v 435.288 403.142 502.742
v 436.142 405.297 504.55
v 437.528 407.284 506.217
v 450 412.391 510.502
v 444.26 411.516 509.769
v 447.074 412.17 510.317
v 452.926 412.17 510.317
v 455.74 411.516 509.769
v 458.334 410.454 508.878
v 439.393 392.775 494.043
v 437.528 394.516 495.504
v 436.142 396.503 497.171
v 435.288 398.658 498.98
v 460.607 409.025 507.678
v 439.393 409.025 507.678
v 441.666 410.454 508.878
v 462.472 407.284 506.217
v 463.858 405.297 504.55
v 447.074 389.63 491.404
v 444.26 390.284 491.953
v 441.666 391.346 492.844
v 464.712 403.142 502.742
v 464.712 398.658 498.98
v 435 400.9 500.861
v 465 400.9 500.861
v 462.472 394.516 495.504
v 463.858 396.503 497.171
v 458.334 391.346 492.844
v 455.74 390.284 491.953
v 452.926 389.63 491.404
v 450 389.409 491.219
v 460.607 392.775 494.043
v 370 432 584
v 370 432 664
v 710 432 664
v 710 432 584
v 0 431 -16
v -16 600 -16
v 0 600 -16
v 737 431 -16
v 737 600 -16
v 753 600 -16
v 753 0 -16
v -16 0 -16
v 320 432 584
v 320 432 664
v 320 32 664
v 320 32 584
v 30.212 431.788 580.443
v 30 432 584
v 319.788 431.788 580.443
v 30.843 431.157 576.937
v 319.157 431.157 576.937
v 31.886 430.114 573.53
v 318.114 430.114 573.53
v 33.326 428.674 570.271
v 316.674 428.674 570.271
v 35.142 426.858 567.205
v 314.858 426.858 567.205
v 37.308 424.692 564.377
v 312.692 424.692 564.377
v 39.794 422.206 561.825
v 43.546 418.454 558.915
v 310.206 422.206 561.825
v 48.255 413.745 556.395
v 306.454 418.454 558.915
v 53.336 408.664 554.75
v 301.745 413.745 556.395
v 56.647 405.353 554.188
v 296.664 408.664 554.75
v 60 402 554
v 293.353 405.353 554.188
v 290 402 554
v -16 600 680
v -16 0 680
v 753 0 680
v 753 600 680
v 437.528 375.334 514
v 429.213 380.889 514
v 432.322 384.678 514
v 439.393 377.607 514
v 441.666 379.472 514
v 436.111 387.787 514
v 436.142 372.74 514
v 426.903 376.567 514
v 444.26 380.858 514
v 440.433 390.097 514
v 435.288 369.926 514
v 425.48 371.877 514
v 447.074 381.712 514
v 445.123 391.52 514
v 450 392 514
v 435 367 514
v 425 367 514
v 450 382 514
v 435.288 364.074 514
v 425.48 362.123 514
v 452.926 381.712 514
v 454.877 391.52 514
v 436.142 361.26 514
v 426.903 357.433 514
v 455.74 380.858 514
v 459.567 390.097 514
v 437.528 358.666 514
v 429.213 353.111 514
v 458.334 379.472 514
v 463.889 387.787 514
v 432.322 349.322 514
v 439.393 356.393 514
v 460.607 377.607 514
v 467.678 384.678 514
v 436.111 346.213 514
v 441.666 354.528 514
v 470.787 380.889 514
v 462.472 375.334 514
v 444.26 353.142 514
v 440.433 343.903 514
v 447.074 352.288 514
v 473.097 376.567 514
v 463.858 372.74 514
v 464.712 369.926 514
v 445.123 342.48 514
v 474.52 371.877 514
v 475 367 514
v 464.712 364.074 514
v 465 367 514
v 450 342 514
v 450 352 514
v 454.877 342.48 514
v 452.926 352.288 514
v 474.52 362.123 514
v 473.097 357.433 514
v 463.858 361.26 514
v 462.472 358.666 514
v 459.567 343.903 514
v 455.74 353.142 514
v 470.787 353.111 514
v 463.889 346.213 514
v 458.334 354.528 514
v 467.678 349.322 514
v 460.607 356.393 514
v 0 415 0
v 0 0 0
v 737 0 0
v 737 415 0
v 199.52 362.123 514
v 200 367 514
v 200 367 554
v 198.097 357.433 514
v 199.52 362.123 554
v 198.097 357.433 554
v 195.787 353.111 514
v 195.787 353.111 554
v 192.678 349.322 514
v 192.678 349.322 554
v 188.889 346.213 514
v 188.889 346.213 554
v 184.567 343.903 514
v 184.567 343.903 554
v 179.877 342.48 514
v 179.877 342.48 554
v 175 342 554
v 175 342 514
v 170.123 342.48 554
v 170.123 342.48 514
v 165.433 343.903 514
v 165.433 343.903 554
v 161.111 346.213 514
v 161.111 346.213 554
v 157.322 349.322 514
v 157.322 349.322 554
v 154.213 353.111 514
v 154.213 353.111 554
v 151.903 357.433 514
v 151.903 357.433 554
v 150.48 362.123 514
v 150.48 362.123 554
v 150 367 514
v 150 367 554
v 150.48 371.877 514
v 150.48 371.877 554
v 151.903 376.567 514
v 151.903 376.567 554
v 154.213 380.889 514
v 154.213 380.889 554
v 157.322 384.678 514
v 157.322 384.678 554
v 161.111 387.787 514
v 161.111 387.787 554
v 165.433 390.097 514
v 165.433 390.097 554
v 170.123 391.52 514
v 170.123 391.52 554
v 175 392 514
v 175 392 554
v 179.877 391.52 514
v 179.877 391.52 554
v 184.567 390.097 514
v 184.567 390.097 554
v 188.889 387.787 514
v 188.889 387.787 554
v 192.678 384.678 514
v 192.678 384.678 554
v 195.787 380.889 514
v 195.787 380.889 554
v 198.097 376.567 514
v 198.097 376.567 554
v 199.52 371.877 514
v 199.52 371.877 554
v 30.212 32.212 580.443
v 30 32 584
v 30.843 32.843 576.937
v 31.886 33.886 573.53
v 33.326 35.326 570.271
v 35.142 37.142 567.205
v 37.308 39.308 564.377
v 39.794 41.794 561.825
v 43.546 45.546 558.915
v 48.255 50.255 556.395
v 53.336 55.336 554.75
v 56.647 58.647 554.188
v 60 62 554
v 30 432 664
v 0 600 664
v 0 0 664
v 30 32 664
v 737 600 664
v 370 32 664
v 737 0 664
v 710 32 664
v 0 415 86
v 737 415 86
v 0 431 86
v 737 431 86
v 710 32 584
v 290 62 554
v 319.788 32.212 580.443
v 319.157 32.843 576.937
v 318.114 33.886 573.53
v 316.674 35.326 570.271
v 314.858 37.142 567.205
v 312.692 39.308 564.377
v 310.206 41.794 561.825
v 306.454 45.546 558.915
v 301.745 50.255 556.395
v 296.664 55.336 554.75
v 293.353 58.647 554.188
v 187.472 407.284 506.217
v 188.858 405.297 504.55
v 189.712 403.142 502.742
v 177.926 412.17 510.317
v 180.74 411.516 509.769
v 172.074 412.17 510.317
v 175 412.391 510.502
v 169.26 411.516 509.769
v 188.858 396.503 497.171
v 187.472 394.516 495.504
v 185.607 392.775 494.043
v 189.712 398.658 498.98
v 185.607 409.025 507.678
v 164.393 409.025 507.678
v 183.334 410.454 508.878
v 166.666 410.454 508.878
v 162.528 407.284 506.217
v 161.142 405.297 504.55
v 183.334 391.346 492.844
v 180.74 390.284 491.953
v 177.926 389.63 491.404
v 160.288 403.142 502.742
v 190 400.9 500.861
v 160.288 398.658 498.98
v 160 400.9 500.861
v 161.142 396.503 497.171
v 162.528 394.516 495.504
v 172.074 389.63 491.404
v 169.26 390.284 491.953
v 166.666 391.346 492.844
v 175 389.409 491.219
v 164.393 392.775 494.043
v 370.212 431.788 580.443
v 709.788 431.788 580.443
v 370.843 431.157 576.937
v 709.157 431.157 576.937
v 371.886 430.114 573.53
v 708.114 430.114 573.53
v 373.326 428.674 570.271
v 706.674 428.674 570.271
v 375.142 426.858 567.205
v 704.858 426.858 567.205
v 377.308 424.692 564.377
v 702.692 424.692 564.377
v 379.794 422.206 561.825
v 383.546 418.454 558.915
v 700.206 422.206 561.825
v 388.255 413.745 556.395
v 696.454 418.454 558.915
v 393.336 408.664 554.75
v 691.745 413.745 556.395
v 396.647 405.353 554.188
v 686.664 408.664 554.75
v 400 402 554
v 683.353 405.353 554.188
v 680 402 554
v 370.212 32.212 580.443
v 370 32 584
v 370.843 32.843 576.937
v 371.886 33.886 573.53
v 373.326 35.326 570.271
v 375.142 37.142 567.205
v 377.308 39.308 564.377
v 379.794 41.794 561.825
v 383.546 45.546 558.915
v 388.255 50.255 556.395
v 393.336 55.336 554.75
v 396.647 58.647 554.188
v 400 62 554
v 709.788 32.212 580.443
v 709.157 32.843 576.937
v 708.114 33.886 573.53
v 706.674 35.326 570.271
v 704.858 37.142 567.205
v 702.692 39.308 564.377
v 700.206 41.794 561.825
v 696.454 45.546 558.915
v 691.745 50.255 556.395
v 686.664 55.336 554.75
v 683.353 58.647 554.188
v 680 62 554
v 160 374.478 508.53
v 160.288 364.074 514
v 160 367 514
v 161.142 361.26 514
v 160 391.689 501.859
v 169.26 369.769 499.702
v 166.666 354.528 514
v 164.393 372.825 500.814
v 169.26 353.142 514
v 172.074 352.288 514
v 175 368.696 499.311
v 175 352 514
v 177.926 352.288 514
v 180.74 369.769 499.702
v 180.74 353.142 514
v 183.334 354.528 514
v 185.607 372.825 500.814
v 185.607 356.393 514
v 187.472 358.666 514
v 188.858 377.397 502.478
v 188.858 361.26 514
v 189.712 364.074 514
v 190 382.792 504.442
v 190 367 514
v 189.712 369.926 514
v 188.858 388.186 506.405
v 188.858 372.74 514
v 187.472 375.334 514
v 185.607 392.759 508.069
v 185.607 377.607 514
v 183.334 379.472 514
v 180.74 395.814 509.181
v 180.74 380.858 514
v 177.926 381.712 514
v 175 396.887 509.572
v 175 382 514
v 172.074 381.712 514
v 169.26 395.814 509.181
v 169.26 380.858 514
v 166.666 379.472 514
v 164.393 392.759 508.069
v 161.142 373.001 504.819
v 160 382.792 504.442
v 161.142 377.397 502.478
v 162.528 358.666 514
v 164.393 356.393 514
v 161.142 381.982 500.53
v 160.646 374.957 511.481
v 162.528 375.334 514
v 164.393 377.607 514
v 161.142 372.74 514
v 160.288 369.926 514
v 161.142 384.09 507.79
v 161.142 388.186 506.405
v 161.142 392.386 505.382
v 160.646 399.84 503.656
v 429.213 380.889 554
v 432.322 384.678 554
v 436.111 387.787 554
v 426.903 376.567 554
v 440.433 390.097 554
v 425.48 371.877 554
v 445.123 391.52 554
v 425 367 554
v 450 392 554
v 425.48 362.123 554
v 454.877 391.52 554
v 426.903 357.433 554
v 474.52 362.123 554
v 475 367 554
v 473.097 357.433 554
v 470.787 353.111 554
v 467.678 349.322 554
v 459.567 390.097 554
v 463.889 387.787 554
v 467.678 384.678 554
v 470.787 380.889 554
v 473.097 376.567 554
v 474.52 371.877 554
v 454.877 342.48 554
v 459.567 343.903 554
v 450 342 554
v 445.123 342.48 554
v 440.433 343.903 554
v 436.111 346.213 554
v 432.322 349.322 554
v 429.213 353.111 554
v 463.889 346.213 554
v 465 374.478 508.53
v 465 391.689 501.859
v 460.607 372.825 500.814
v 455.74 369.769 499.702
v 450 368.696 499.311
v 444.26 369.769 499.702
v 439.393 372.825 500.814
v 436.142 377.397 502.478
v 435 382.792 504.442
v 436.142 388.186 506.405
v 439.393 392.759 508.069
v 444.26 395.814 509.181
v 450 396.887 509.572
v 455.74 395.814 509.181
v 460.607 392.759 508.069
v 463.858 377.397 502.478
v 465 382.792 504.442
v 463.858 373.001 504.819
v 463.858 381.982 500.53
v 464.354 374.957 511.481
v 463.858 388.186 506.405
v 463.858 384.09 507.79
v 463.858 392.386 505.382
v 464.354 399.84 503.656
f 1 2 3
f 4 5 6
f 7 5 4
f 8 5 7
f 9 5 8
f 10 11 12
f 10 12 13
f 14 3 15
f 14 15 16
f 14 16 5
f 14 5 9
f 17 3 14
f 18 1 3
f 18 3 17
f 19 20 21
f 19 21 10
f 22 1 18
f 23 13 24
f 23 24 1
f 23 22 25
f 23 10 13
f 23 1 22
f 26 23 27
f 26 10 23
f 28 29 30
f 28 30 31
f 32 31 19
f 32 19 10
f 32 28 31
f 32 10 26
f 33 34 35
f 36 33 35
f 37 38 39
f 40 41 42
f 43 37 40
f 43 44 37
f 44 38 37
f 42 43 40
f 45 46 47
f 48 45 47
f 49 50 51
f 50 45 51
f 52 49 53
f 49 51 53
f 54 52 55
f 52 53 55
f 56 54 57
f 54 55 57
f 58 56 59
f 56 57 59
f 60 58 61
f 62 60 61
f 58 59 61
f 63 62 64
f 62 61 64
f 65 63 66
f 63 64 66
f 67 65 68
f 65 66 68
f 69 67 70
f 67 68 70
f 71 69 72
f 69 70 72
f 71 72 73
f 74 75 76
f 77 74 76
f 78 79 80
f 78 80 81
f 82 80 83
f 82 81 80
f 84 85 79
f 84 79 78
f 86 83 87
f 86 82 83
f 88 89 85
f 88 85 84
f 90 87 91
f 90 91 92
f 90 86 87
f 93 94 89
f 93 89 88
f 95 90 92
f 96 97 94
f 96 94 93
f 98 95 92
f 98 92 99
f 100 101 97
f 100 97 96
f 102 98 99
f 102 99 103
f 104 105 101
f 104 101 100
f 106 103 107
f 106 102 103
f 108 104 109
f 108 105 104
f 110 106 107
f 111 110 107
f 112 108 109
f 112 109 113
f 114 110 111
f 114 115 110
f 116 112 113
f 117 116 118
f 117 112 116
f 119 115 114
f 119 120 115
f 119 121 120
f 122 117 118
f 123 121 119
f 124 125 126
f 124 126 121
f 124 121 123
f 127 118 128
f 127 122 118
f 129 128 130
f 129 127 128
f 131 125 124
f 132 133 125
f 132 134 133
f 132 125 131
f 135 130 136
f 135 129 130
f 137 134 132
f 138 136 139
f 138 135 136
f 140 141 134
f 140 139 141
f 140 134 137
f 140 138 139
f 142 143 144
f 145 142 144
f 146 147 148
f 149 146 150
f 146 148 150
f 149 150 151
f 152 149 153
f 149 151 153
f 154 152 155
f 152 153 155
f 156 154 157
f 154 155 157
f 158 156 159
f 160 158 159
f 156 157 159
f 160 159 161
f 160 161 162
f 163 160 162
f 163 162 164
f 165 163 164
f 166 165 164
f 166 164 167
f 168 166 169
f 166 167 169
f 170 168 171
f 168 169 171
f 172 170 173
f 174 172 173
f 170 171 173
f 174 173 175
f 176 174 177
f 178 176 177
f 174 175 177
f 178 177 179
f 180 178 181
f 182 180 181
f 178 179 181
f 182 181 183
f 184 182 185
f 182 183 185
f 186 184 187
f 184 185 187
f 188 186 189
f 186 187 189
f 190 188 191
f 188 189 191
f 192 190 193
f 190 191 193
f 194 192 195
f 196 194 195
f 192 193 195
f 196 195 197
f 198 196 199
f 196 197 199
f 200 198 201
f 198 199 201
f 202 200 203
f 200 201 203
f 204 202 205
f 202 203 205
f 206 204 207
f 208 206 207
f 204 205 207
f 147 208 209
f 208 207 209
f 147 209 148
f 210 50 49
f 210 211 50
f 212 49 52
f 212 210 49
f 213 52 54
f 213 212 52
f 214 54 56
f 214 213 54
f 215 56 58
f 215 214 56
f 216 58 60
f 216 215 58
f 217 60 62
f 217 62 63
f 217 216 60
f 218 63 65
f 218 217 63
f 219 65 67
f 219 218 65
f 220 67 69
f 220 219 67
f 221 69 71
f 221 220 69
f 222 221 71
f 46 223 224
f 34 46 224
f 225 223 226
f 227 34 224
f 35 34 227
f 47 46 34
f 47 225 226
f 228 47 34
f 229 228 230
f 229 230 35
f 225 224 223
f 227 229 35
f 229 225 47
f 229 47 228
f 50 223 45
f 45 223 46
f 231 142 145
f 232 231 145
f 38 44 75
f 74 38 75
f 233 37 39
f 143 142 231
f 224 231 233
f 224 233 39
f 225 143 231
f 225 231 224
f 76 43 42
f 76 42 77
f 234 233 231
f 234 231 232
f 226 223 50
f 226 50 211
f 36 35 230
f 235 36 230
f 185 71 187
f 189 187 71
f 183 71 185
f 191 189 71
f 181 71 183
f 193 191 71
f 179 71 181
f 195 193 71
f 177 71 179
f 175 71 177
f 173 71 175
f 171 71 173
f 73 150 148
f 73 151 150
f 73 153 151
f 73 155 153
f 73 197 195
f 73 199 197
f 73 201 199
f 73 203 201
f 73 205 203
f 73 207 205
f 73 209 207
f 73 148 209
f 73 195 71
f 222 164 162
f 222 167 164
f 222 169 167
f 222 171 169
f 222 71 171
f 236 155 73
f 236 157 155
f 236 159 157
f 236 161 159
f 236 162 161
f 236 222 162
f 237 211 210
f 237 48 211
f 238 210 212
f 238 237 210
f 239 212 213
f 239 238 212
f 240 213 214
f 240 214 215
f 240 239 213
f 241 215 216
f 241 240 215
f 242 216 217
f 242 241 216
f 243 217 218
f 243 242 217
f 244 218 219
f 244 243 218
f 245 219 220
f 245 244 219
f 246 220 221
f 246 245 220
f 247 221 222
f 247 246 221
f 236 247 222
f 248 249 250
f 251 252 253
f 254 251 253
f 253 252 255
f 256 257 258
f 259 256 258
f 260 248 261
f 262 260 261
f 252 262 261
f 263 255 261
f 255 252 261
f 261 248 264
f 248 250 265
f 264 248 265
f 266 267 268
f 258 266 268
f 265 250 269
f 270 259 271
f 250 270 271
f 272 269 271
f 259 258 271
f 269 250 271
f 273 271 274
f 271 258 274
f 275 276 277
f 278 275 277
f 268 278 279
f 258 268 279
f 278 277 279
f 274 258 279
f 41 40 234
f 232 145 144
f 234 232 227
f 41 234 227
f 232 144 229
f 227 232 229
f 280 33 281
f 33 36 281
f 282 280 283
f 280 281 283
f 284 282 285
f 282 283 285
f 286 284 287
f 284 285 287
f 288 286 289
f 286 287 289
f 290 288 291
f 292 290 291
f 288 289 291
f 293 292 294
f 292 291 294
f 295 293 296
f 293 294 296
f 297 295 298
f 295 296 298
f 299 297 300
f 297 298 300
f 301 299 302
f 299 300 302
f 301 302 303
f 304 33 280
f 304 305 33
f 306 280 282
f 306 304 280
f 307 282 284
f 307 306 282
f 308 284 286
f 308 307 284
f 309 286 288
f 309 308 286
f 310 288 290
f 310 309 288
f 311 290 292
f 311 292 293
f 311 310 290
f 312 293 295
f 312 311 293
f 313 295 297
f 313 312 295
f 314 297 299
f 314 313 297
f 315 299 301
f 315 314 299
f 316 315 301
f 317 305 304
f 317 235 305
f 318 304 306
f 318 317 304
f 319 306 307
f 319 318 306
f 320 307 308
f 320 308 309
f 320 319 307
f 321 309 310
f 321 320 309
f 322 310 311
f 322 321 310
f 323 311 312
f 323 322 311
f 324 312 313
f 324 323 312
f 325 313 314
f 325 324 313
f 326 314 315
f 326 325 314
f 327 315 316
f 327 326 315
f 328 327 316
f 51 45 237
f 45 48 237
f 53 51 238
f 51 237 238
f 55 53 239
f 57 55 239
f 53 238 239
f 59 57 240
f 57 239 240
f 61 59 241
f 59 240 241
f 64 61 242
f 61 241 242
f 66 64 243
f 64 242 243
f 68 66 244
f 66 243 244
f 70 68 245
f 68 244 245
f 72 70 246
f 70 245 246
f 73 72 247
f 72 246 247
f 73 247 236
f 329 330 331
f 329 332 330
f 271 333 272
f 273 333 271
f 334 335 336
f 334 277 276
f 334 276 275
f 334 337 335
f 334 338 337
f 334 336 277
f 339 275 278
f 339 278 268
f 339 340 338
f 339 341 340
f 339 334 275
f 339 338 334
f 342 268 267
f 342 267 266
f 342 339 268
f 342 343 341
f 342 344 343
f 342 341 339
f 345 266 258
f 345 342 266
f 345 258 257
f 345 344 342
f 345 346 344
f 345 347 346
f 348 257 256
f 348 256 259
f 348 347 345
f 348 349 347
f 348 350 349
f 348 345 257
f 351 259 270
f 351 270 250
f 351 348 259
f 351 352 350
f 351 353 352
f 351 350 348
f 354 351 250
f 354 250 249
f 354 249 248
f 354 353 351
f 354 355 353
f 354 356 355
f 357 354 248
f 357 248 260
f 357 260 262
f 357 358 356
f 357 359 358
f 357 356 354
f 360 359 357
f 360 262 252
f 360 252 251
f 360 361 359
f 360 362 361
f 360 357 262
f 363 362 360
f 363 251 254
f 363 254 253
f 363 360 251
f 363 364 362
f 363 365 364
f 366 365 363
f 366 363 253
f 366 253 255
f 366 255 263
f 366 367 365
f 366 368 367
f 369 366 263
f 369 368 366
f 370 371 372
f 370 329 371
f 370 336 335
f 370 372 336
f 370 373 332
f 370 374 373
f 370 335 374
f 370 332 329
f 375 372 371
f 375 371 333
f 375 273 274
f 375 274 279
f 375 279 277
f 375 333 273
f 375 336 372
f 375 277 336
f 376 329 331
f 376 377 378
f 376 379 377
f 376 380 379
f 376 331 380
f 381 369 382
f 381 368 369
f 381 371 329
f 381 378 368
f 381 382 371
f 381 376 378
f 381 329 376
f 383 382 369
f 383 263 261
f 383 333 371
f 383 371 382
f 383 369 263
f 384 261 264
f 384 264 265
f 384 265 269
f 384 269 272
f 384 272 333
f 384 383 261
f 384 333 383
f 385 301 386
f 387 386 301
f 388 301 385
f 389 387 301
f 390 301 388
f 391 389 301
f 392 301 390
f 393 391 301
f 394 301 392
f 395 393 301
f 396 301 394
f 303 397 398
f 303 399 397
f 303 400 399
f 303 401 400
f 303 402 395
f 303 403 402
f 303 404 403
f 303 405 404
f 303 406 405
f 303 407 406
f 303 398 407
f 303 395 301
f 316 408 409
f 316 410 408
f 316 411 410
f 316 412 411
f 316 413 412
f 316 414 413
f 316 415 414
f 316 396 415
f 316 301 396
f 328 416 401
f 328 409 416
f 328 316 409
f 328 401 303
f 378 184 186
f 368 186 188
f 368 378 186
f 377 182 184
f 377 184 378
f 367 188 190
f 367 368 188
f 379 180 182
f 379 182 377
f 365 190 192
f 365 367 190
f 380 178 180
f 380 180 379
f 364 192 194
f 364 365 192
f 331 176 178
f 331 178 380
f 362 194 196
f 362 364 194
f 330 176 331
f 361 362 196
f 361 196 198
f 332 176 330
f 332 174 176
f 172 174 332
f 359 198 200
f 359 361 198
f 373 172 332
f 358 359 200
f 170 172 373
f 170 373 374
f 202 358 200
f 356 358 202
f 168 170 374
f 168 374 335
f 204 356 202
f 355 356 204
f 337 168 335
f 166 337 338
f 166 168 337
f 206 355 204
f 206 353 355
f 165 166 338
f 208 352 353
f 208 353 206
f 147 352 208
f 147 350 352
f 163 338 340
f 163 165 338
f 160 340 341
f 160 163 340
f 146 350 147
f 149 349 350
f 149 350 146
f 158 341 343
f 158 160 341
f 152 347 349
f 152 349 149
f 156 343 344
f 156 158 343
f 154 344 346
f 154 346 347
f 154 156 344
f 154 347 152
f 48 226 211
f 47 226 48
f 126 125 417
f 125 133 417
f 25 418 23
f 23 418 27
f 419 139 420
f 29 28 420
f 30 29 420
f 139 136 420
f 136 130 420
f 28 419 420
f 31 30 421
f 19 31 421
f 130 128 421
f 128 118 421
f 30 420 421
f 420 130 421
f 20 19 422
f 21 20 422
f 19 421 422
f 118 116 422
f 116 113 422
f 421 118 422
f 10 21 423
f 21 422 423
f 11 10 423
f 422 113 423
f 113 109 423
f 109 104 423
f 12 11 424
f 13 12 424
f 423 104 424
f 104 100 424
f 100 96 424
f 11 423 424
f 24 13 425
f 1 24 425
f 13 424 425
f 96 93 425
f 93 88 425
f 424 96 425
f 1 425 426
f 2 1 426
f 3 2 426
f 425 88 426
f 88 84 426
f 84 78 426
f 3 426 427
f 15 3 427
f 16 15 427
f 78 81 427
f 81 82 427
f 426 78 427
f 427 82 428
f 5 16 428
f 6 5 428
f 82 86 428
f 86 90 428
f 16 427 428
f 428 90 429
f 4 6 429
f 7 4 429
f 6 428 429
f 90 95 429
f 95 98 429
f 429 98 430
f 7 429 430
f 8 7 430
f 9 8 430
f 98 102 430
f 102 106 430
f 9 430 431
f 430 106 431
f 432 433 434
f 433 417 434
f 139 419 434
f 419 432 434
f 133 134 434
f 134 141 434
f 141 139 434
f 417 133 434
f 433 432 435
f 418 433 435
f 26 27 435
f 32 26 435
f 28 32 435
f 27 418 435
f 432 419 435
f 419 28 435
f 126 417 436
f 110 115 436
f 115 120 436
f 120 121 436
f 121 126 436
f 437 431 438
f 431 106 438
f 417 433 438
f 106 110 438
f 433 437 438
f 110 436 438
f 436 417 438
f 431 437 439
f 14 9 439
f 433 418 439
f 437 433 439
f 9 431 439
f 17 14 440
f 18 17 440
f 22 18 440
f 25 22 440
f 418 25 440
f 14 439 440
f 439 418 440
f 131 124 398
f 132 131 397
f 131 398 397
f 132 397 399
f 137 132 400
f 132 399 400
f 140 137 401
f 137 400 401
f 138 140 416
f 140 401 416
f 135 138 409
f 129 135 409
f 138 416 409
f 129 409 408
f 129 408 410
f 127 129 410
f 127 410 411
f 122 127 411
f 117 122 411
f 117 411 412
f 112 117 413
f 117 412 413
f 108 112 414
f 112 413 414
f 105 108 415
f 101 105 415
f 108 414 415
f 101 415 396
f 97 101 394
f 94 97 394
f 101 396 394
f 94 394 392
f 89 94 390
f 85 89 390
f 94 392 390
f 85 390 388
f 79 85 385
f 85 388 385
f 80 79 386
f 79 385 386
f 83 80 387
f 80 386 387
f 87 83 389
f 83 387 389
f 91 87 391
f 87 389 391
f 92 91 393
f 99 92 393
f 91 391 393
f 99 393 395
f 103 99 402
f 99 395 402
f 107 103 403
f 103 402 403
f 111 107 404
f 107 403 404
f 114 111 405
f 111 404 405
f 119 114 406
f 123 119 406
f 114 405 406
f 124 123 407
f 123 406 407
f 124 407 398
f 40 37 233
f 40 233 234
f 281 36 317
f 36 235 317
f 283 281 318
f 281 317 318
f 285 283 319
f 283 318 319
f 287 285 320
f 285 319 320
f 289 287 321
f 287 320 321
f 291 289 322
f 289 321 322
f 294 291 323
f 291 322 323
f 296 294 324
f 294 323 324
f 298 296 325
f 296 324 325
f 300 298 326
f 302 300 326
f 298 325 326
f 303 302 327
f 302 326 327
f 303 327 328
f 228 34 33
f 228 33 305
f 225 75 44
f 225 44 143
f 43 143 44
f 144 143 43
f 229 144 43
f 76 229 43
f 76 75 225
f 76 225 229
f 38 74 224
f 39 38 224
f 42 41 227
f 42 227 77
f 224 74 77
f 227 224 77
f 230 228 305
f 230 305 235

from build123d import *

# Parameters (mm, degrees)
F0_W      = 769
F0_H      = 696
F0_W_2    = 737
F0_H_2    = 664
F1_DEPTH  = 600
F2_W      = 737
F2_H      = 16
F3_DEPTH  = 86
F4_W      = 290
F4_H      = 400
F4_W_2    = 340
F5_DEPTH  = 110
F6_R      = 30
F7_W      = 737
F7_H      = 169
F8_DEPTH  = 16
F9_R      = 25
F10_DEPTH = 40
F11_R     = 25
F12_DEPTH = 40
F13_R     = 15
F14_ANGLE = 40


# Not quite as in the source:
# - a feature of the source that left no trace in its solid (it failed there, or was rolled back) is left out
# - a pattern or mirror of a feature is missing from the dataset's text; its kind, count and spacing are read off the source's solid


with BuildPart() as f1:
    # F0 (on Front) → F1 (new body)
    with BuildSketch(Plane.XZ):
        with Locations((368.5, 332)):
            Rectangle(F0_W, F0_H)
        with Locations((368.5, 332)):
            Rectangle(F0_W_2, F0_H_2, mode=Mode.SUBTRACT)
    extrude(amount=-F1_DEPTH)

    # F2 (on face) → F3 (join)
    with BuildSketch(Plane.XY):
        with Locations((368.5, 423)):
            Rectangle(F2_W, F2_H)
    extrude(amount=F3_DEPTH)

    # F4 (on face) → F5 (join)
    with BuildSketch(Plane(origin=(0, 0, 664), x_dir=(1, 0, 0), z_dir=(0, 0, -1))):
        with Locations((175, -232)):
            Rectangle(F4_W, F4_H)
        with Locations((540, -232)):
            Rectangle(F4_W_2, F4_H)
    extrude(amount=F5_DEPTH)

    # F6
    f6_edges = [f1.edges().sort_by_distance(p)[0] for p in [
        (175, 32, 554),
        (30, 232, 554),
        (175, 432, 554),
        (320, 232, 554),
        (540, 32, 554),
        (370, 232, 554),
        (540, 432, 554),
        (710, 232, 554),
    ]]
    fillet(f6_edges, radius=F6_R)

    # F7 (on face) → F8 (cut, through all)
    with BuildSketch(Plane.XY):
        with Locations((368.5, 515.5)):
            Rectangle(F7_W, F7_H)
    extrude(amount=-F8_DEPTH, mode=Mode.SUBTRACT)

    # F9 (on face) → F10 (join)
    with BuildSketch(Plane(origin=(0, 0, 554), x_dir=(1, 0, 0), z_dir=(0, 0, -1))):
        with Locations((175, -367)):
            Circle(F9_R)
    extrude(amount=F10_DEPTH)

    # F11 (on face) → F12 (join)
    with BuildSketch(Plane(origin=(0, 0, 554), x_dir=(1, 0, 0), z_dir=(0, 0, -1))):
        with Locations((450, -367)):
            Circle(F11_R)
    extrude(amount=F12_DEPTH)

    # F13 (on face) → F14 (revolve)
    with BuildSketch(Plane(origin=(0, 0, 514), x_dir=(1, 0, 0), z_dir=(0, 0, -1))):
        with Locations((450, -367)):
            Circle(F13_R)
    f14 = revolve(axis=Axis((540, 402, 554), (1, 0, 0)), revolution_arc=F14_ANGLE)

    # F14_copies: F14 across plane
    add(f14.mirror(Plane(origin=(312.5, 0, 0), x_dir=(0, 0, -1), z_dir=(-1, 0, 0))))


solid = f1.part
